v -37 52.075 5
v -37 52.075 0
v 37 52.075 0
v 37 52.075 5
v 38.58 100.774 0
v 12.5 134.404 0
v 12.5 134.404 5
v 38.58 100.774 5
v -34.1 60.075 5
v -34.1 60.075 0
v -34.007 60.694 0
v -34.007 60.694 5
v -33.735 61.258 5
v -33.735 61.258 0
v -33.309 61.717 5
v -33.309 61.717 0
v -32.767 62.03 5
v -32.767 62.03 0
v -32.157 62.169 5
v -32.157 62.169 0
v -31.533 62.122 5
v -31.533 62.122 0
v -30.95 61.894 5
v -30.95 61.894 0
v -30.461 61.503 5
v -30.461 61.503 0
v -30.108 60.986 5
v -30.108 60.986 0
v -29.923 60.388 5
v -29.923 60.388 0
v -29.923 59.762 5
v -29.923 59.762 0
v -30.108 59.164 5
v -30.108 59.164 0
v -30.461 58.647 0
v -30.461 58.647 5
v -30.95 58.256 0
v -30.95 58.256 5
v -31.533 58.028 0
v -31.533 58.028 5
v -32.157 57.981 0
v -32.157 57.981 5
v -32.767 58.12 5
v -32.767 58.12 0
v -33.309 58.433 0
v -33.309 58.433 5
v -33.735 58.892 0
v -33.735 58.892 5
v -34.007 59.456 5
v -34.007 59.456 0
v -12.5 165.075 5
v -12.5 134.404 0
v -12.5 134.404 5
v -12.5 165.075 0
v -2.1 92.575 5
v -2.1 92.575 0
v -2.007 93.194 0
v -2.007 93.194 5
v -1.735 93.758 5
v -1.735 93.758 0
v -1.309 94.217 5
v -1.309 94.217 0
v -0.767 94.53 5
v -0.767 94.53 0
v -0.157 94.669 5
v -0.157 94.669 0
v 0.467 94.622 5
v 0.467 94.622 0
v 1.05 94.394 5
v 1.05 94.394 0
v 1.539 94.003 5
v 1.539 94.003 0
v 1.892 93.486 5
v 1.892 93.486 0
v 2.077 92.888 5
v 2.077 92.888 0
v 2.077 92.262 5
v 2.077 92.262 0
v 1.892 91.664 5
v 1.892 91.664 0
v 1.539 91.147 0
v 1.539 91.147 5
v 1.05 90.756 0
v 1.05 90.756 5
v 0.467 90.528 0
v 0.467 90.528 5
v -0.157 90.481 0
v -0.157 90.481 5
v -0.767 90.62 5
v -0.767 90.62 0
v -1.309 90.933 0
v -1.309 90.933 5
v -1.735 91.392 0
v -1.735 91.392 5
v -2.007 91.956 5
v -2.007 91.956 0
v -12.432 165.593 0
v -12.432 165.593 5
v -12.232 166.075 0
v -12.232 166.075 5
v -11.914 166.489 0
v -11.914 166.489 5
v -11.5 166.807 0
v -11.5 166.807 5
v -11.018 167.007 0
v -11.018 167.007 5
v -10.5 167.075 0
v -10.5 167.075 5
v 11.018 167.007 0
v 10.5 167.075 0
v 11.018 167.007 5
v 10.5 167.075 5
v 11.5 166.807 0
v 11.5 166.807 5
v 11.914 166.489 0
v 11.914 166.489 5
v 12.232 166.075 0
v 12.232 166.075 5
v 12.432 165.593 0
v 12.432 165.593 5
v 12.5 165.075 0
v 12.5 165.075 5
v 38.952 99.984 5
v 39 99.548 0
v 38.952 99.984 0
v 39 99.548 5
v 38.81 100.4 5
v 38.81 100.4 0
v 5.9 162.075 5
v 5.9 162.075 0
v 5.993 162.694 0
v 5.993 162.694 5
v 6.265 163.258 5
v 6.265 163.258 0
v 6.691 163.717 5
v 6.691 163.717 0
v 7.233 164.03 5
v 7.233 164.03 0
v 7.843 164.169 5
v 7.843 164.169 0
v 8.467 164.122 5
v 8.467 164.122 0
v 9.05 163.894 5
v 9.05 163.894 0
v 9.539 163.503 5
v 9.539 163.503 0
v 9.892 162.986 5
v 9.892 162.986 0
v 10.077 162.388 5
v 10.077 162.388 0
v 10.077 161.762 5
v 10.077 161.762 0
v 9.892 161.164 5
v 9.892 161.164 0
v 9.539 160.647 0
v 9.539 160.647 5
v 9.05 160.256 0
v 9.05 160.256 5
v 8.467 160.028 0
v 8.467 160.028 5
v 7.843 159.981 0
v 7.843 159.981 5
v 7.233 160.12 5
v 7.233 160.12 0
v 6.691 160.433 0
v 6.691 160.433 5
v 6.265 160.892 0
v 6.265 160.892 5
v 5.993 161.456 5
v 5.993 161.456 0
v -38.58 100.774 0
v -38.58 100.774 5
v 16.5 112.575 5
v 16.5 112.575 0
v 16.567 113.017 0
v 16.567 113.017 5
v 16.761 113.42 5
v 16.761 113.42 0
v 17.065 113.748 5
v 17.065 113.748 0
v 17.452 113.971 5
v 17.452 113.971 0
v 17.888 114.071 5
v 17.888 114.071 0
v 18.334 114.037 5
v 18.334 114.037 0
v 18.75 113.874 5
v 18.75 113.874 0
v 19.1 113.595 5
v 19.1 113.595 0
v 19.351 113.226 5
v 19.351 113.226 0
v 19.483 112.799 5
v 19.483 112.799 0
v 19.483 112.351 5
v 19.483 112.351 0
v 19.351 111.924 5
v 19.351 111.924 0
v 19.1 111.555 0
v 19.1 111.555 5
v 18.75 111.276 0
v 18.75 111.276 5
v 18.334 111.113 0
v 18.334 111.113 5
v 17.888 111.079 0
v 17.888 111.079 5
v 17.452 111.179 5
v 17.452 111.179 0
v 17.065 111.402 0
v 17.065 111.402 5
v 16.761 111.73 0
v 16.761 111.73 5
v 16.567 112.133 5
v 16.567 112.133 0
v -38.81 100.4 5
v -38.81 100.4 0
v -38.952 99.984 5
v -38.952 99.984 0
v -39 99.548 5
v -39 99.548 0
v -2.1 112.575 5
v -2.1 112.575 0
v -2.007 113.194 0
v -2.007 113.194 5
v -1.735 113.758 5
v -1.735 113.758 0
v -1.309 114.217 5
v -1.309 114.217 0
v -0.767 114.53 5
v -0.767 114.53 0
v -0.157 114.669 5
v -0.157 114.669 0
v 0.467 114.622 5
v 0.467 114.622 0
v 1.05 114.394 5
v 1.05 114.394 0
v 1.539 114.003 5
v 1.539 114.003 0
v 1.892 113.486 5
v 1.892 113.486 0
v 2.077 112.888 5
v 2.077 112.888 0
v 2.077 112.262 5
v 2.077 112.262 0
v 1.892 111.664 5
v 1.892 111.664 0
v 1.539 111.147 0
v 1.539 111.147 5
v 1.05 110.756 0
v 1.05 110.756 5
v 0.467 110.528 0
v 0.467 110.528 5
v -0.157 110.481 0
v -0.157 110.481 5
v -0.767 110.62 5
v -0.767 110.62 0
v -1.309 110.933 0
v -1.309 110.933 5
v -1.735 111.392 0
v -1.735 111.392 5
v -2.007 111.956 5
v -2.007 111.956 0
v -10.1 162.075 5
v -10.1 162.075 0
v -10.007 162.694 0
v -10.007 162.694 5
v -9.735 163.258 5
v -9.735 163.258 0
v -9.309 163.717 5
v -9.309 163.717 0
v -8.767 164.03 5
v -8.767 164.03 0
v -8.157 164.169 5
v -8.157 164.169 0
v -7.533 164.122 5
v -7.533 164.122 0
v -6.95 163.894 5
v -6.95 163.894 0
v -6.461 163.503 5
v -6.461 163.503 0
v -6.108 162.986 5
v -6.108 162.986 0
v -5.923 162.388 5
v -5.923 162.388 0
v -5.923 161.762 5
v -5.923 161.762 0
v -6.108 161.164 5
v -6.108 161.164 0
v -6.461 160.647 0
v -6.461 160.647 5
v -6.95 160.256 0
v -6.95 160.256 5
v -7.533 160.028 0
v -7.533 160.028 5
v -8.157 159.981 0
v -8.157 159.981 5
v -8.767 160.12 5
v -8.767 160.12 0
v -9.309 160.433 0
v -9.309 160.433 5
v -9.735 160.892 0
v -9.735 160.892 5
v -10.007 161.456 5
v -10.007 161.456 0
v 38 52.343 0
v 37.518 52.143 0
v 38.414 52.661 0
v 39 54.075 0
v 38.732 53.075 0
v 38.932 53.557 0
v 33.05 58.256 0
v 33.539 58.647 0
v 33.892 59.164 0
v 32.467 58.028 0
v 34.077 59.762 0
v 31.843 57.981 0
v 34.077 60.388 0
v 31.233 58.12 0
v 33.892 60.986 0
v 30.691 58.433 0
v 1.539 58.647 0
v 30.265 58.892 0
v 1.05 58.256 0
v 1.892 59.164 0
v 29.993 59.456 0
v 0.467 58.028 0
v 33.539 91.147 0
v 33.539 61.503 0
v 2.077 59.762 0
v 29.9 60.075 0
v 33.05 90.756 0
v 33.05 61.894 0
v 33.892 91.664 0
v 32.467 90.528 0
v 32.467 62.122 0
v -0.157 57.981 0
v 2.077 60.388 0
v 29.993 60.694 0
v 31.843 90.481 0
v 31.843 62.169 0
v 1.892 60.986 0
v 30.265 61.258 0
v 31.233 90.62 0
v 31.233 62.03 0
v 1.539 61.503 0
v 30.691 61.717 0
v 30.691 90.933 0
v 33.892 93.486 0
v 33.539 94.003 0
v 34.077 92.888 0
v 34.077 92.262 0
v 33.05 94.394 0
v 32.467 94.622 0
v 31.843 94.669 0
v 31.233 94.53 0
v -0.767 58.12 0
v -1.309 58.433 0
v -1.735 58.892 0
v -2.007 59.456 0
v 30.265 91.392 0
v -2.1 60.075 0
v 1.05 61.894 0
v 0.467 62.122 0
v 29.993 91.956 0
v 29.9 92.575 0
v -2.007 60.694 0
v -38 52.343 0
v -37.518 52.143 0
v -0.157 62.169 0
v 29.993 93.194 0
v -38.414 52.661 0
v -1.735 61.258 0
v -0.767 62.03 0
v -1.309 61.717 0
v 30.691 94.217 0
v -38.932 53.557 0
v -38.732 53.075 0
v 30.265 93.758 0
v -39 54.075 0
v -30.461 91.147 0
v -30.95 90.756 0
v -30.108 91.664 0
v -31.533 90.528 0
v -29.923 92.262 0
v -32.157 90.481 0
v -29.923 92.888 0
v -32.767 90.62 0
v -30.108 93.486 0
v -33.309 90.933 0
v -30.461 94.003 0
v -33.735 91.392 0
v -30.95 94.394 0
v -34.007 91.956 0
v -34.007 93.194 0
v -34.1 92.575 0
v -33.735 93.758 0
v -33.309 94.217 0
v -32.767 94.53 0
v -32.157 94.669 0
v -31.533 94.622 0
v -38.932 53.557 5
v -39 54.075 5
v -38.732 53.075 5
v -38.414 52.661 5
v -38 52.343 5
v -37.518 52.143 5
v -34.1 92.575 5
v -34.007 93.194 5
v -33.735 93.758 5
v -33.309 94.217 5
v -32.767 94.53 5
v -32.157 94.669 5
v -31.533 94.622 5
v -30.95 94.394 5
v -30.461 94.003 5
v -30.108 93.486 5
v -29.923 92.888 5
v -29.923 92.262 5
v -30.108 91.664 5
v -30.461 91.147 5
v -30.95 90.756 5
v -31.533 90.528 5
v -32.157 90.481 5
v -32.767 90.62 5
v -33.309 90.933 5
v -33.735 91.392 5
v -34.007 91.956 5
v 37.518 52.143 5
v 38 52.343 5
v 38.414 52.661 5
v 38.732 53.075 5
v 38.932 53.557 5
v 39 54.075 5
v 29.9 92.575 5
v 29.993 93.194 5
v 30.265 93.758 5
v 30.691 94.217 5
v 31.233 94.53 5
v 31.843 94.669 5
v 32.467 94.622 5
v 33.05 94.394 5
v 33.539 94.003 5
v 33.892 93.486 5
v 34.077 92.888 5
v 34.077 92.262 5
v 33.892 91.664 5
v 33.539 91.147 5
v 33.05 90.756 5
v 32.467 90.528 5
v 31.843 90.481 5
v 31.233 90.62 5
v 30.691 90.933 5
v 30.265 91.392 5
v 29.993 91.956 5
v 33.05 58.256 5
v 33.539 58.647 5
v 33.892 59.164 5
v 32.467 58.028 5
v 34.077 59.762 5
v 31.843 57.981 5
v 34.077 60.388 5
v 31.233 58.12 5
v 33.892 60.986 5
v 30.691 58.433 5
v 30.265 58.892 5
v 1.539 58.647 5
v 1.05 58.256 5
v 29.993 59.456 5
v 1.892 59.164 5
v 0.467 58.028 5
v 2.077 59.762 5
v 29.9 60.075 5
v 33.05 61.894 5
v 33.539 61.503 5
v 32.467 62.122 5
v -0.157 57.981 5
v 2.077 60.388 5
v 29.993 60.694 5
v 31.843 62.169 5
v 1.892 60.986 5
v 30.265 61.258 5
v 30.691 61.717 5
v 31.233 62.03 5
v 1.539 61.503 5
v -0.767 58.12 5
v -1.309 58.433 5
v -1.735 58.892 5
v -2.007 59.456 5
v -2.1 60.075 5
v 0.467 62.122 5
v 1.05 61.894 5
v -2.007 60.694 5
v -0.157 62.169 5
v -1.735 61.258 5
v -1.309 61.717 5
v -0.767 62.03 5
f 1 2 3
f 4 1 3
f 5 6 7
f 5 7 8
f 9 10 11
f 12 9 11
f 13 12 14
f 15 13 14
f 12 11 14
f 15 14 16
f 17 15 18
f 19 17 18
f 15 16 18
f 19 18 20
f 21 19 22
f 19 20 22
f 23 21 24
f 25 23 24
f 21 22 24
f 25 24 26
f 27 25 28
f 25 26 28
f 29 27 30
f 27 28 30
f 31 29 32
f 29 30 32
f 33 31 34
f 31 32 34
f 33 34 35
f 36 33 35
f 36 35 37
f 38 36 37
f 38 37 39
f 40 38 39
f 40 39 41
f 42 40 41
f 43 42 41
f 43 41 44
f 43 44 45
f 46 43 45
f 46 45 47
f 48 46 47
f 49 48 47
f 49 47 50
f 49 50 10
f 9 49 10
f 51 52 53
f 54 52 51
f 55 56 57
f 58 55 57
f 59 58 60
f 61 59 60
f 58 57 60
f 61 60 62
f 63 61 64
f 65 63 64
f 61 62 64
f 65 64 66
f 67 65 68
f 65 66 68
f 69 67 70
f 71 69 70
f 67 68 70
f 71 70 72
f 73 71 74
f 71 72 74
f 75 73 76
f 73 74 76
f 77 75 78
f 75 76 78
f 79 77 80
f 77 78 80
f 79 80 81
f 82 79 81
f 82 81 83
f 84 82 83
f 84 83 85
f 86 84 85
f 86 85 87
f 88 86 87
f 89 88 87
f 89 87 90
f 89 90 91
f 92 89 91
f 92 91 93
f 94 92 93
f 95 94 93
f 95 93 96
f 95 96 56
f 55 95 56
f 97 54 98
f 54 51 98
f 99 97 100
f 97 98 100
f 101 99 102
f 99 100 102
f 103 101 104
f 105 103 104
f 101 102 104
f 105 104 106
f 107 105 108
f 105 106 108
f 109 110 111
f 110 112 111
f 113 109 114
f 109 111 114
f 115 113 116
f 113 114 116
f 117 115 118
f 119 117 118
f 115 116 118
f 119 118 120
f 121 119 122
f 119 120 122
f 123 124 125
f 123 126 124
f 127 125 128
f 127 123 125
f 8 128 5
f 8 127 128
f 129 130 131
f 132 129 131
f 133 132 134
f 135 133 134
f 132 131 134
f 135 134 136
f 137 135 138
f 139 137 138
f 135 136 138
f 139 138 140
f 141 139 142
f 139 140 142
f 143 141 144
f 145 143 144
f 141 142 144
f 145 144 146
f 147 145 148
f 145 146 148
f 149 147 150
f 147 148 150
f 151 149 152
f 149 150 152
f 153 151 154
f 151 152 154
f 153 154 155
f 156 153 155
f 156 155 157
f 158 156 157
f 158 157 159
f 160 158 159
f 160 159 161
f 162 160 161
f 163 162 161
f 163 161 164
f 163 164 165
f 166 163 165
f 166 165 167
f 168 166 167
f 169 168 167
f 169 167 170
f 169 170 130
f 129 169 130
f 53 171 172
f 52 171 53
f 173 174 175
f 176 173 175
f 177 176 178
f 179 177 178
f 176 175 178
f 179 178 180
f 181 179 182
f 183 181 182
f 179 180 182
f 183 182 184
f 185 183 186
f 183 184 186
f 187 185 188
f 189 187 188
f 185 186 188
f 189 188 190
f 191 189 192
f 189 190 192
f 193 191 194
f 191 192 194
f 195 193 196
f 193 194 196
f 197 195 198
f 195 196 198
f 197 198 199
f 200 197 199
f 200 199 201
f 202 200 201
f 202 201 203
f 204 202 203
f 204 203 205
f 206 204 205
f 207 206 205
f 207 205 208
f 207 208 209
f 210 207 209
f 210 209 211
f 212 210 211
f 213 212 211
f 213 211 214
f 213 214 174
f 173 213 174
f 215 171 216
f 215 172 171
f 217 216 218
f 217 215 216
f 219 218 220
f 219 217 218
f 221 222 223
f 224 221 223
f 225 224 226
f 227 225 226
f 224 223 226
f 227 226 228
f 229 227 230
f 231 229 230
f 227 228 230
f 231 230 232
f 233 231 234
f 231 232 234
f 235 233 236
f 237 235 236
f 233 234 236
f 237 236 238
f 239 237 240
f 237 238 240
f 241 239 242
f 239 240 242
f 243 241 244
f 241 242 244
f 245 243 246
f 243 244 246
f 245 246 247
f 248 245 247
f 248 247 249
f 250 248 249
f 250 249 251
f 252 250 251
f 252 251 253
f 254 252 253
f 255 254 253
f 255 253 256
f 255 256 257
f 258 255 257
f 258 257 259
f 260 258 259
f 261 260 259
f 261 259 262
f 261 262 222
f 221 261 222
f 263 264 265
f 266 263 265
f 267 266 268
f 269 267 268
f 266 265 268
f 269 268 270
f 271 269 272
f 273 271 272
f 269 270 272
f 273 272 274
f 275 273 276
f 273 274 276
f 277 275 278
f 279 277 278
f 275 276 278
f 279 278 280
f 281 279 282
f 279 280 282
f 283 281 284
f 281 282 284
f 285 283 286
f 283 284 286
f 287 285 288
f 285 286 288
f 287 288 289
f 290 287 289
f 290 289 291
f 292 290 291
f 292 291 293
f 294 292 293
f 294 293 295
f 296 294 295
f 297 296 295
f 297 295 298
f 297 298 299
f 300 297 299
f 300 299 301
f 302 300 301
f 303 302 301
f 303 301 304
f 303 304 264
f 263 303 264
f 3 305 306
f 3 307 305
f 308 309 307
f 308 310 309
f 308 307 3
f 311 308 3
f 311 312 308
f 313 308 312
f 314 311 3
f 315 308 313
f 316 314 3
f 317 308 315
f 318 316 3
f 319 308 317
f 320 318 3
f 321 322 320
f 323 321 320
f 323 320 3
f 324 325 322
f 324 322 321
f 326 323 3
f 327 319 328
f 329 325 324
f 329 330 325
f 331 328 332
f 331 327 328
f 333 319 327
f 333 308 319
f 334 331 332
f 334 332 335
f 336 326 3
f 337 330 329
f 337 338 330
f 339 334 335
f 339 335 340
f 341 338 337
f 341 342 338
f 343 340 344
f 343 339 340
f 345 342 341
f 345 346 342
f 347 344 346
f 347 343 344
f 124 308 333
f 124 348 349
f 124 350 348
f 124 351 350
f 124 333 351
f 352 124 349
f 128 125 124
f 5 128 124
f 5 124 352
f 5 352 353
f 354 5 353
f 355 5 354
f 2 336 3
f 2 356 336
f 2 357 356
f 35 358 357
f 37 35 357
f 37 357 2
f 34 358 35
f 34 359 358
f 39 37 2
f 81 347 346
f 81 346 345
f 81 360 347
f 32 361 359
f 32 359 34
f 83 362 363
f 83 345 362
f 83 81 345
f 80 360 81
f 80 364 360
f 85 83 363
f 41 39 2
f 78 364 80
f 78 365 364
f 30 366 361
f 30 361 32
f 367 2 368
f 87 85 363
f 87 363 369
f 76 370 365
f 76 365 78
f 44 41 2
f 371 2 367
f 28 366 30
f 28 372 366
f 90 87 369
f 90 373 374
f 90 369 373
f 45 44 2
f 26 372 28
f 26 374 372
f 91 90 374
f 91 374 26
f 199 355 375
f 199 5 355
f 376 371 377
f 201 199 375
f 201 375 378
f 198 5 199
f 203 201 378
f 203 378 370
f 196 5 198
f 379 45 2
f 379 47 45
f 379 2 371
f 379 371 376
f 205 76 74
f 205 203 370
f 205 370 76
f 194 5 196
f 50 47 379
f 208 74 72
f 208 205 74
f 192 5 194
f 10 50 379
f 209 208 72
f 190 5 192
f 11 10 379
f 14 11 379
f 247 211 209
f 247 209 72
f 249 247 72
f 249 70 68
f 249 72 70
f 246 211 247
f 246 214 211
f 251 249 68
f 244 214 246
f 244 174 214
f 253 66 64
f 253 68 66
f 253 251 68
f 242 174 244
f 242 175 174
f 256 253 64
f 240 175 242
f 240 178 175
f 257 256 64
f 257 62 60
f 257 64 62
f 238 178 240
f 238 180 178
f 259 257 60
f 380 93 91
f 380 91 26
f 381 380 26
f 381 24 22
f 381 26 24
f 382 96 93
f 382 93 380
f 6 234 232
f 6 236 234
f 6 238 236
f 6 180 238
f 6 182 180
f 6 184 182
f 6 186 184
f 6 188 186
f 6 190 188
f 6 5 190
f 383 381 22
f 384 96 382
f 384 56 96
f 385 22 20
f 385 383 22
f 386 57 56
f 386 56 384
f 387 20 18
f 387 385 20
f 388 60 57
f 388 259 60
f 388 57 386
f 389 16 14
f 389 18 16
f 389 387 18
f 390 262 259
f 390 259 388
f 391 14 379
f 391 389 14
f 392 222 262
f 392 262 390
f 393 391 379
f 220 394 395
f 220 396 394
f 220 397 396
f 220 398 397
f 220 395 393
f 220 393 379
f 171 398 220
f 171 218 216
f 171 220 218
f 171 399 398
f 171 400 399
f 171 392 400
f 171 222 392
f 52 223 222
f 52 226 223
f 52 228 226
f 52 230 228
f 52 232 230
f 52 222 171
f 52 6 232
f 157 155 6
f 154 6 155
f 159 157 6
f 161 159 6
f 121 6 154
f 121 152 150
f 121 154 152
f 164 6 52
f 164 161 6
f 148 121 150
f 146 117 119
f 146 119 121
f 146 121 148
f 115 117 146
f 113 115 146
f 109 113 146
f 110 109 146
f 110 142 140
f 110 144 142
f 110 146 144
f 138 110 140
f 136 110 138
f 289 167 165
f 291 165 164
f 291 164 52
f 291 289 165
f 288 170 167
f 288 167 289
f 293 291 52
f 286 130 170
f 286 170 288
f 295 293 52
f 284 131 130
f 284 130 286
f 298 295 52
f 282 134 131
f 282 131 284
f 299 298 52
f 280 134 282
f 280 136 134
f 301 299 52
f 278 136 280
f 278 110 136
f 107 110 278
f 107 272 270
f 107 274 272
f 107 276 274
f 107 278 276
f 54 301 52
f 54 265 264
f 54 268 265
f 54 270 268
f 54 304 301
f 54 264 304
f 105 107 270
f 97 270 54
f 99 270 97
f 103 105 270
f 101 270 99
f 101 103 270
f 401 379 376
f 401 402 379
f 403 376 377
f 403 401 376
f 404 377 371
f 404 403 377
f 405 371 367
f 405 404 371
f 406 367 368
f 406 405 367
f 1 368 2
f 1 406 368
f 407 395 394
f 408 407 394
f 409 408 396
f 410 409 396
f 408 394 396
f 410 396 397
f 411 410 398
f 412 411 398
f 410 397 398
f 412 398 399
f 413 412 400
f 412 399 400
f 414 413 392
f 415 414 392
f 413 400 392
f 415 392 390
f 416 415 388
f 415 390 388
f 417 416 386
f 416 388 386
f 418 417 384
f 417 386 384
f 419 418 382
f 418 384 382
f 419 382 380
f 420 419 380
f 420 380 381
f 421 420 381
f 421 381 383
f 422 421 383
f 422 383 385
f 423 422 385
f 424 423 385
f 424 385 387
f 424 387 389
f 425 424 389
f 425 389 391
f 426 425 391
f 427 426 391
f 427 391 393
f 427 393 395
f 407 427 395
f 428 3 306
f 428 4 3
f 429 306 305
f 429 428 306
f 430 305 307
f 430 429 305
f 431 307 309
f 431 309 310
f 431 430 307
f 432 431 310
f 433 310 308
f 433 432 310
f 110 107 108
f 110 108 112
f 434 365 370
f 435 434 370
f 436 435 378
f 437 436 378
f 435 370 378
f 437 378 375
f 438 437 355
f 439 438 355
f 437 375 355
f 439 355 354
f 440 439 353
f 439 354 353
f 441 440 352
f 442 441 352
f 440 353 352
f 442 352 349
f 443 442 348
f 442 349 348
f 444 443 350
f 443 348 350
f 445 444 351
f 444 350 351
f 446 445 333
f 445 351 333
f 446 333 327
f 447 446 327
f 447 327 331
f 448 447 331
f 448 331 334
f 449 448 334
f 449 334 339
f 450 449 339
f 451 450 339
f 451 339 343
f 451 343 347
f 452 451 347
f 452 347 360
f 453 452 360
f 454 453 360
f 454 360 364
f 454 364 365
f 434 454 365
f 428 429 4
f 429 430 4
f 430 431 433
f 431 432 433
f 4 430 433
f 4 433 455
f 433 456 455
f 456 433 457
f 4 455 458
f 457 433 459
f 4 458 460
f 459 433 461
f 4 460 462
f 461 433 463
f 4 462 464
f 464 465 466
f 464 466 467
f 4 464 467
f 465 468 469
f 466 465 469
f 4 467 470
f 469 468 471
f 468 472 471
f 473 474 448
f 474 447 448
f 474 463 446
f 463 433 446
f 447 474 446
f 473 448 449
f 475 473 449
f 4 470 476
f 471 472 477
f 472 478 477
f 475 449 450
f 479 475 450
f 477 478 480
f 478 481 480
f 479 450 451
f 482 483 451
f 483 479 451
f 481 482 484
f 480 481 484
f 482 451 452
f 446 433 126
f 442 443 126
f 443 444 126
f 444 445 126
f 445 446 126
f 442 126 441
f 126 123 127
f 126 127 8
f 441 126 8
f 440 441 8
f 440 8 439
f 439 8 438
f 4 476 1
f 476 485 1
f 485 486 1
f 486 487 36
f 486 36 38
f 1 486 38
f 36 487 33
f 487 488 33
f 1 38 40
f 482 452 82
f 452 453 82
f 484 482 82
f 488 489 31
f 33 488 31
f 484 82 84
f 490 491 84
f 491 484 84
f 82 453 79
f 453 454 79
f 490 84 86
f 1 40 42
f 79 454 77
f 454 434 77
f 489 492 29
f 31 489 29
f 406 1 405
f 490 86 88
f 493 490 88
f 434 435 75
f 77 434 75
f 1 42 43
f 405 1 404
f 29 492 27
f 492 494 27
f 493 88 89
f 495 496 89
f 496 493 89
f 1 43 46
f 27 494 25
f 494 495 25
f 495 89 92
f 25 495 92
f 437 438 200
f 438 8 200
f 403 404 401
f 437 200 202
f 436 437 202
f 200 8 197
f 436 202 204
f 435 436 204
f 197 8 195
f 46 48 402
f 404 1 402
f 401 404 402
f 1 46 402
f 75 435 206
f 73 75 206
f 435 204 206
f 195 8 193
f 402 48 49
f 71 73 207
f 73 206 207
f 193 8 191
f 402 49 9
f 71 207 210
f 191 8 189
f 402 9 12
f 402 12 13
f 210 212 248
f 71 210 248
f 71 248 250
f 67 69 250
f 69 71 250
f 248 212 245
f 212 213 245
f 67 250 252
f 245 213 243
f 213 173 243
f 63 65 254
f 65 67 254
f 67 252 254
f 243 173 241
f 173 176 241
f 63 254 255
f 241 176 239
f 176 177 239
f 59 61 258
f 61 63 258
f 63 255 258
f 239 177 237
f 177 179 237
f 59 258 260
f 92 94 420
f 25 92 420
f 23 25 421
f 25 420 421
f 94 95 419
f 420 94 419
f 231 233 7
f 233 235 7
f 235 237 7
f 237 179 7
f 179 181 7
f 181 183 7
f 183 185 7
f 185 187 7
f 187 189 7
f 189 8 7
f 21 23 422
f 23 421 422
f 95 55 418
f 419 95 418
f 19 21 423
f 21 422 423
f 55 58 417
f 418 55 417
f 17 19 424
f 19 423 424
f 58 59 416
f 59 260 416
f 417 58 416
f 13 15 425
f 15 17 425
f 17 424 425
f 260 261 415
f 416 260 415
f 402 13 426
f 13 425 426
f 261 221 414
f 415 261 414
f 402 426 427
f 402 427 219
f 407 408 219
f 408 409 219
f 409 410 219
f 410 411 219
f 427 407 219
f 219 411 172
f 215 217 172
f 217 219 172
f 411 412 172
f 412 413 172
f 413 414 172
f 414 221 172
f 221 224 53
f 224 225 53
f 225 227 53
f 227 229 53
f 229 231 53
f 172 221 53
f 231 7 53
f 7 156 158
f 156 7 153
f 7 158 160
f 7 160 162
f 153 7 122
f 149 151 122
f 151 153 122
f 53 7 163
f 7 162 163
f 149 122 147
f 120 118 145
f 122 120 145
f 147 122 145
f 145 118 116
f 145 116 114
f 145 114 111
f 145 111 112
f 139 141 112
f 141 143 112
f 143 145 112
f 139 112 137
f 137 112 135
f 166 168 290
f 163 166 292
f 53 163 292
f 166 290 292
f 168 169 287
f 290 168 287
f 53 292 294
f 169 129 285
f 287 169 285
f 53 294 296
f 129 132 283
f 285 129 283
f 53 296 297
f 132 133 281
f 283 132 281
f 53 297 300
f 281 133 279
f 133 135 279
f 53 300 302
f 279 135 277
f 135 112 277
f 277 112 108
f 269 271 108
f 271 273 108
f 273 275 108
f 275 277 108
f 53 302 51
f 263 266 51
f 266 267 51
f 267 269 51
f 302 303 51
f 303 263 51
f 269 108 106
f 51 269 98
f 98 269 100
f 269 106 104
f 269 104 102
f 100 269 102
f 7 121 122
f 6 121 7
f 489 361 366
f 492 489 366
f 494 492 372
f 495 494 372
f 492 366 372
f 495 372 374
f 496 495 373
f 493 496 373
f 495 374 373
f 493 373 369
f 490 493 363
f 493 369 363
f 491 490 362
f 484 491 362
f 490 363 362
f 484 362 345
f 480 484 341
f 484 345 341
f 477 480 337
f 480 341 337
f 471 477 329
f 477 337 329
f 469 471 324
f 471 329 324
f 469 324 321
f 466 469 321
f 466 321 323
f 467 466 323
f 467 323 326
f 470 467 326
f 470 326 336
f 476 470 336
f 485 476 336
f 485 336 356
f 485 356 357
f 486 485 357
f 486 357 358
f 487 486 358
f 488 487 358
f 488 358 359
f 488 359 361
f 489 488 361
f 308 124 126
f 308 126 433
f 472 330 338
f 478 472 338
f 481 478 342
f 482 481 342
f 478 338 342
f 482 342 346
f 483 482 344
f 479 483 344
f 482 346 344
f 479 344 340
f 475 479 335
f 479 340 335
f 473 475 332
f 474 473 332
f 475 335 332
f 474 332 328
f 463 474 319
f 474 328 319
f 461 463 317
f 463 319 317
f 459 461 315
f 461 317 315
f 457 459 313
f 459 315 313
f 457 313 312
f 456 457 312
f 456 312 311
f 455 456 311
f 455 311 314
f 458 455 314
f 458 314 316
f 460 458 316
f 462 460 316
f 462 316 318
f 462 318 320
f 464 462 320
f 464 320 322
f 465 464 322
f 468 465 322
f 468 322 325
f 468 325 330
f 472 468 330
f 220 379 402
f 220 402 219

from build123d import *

# Parameters (mm, degrees)
BOSS_EXTRUDE1_DEPTH = 5
SKETCH2_R           = 2.1
SKETCH2_R_2         = 1.5
CUT_EXTRUDE1_DEPTH  = 6
SKETCH4_R           = 2.1
CUT_EXTRUDE2_DEPTH  = 6
FILLET1_R           = 2


with BuildPart() as part:
    # Sketch1 → Boss-Extrude1 (new body)
    with BuildSketch(Plane.XY):
        Polygon((-39, 100.232788632), (-12.5, 134.403841263), (-12.5, 167.075), (12.5, 167.075), (12.5, 134.403841263), (39, 100.232788632), (39, 52.075), (27.012855738, 52.075), (-27.012855738, 52.075), (-39, 52.075), align=None)
    extrude(amount=BOSS_EXTRUDE1_DEPTH)

    # Sketch2 → Cut-Extrude1 (cut, through all)
    with BuildSketch(Plane(origin=(0, 0, 0), x_dir=(-1, 0, 0), z_dir=(0, 0, -1))):
        with Locations((-32, 92.575)):
            Circle(SKETCH2_R)
        with Locations((32, 92.575)):
            Circle(SKETCH2_R)
        with Locations((8, 162.075)):
            Circle(SKETCH2_R)
        with Locations((-8, 162.075)):
            Circle(SKETCH2_R)
        with Locations((-18, 112.575)):
            Circle(SKETCH2_R_2)
    extrude(amount=-CUT_EXTRUDE1_DEPTH, mode=Mode.SUBTRACT)

    # Sketch4 → Cut-Extrude2 (cut, through all)
    with BuildSketch(Plane(origin=(0, 0, 0), x_dir=(-1, 0, 0), z_dir=(0, 0, -1))):
        with Locations((-32, 60.075)):
            Circle(SKETCH4_R)
        with Locations((32, 60.075)):
            Circle(SKETCH4_R)
        with Locations((0, 60.075)):
            Circle(SKETCH4_R)
        with Locations((0, 112.575)):
            Circle(SKETCH4_R)
        with Locations((0, 92.575)):
            Circle(SKETCH4_R)
    extrude(amount=-CUT_EXTRUDE2_DEPTH, mode=Mode.SUBTRACT)

    # Fillet1
    fillet1_edges = [part.edges().sort_by_distance(p)[0] for p in [
        (-39, 100.232788632, 2.5),
        (-12.5, 167.075, 2.5),
        (12.5, 167.075, 2.5),
        (39, 100.232788632, 2.5),
        (39, 52.075, 2.5),
        (-39, 52.075, 2.5),
    ]]
    fillet(fillet1_edges, radius=FILLET1_R)


solid = part.part
